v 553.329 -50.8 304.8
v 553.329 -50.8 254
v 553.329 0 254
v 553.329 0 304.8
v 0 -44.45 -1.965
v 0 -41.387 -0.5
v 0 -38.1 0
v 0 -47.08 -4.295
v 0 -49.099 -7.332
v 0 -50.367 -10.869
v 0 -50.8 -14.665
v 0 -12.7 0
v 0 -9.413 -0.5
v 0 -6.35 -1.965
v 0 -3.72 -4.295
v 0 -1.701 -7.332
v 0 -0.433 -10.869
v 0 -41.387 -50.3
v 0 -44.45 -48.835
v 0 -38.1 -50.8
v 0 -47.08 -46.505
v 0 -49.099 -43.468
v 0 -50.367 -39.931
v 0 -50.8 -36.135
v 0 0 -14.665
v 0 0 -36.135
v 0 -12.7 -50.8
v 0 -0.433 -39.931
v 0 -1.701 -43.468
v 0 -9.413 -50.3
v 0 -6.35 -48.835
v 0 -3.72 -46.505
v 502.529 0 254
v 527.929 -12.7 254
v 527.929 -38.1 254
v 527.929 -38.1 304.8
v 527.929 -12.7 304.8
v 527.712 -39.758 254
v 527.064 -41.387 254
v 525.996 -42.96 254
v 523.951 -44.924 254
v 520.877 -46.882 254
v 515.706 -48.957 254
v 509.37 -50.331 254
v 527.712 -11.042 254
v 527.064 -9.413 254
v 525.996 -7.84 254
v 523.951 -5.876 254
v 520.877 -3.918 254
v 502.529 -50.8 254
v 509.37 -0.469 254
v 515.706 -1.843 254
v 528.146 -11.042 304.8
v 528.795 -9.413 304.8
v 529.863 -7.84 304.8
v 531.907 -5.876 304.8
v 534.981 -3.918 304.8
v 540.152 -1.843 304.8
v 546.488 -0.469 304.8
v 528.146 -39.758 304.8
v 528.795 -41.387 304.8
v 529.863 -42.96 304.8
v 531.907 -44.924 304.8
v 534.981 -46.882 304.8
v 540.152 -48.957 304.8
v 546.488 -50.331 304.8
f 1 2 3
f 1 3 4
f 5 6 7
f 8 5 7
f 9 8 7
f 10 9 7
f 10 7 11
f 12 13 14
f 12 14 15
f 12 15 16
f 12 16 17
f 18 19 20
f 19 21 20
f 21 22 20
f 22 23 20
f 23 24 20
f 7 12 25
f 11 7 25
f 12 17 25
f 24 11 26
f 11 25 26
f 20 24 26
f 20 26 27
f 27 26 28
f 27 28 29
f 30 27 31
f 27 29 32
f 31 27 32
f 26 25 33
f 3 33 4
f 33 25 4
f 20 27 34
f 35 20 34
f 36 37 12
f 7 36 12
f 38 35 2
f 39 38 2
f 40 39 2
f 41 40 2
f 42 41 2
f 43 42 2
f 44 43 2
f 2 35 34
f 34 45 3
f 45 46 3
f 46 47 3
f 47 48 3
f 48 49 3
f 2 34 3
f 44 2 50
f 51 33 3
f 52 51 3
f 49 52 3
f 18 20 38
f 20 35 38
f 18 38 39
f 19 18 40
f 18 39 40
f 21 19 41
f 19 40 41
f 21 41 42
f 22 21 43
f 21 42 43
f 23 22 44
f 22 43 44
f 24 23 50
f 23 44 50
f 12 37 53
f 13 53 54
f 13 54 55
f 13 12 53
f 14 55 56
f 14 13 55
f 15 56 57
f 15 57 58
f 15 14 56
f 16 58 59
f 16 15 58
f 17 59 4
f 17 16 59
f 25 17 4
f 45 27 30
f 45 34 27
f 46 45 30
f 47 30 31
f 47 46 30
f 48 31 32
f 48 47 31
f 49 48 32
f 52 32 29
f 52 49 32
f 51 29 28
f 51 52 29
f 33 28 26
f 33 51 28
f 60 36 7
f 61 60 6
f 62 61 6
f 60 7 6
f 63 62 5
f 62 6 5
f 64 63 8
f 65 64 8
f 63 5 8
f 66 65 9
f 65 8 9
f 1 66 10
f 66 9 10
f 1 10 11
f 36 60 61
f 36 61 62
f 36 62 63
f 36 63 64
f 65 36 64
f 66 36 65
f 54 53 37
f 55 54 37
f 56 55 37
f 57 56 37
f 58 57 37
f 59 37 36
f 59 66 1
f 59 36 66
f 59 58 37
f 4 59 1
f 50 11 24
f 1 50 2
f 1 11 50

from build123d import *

# Parameters (mm, degrees)
F0_W     = 25.4
F0_H     = 50.8
F1_DEPTH = 50.8
F2_R     = 12.7


with BuildPart() as f1:
    # F0 (on Front) → F1 (new body)
    with BuildSketch(Plane.XZ):
        Polygon((527.929086, 304.8), (0, 0), (0, -50.8), (527.929086, 254), align=None)
        with Locations((540.629086, 279.4)):
            Rectangle(F0_W, F0_H)
    extrude(amount=F1_DEPTH)

    # F2
    f2_edges = [f1.edges().sort_by_distance(p)[0] for p in [
        (263.964543, -50.8, 152.4),
        (263.964543, -50.8, 101.6),
        (263.964543, 0, 152.4),
        (263.964543, 0, 101.6),
    ]]
    fillet(f2_edges, radius=F2_R)


solid = f1.part
